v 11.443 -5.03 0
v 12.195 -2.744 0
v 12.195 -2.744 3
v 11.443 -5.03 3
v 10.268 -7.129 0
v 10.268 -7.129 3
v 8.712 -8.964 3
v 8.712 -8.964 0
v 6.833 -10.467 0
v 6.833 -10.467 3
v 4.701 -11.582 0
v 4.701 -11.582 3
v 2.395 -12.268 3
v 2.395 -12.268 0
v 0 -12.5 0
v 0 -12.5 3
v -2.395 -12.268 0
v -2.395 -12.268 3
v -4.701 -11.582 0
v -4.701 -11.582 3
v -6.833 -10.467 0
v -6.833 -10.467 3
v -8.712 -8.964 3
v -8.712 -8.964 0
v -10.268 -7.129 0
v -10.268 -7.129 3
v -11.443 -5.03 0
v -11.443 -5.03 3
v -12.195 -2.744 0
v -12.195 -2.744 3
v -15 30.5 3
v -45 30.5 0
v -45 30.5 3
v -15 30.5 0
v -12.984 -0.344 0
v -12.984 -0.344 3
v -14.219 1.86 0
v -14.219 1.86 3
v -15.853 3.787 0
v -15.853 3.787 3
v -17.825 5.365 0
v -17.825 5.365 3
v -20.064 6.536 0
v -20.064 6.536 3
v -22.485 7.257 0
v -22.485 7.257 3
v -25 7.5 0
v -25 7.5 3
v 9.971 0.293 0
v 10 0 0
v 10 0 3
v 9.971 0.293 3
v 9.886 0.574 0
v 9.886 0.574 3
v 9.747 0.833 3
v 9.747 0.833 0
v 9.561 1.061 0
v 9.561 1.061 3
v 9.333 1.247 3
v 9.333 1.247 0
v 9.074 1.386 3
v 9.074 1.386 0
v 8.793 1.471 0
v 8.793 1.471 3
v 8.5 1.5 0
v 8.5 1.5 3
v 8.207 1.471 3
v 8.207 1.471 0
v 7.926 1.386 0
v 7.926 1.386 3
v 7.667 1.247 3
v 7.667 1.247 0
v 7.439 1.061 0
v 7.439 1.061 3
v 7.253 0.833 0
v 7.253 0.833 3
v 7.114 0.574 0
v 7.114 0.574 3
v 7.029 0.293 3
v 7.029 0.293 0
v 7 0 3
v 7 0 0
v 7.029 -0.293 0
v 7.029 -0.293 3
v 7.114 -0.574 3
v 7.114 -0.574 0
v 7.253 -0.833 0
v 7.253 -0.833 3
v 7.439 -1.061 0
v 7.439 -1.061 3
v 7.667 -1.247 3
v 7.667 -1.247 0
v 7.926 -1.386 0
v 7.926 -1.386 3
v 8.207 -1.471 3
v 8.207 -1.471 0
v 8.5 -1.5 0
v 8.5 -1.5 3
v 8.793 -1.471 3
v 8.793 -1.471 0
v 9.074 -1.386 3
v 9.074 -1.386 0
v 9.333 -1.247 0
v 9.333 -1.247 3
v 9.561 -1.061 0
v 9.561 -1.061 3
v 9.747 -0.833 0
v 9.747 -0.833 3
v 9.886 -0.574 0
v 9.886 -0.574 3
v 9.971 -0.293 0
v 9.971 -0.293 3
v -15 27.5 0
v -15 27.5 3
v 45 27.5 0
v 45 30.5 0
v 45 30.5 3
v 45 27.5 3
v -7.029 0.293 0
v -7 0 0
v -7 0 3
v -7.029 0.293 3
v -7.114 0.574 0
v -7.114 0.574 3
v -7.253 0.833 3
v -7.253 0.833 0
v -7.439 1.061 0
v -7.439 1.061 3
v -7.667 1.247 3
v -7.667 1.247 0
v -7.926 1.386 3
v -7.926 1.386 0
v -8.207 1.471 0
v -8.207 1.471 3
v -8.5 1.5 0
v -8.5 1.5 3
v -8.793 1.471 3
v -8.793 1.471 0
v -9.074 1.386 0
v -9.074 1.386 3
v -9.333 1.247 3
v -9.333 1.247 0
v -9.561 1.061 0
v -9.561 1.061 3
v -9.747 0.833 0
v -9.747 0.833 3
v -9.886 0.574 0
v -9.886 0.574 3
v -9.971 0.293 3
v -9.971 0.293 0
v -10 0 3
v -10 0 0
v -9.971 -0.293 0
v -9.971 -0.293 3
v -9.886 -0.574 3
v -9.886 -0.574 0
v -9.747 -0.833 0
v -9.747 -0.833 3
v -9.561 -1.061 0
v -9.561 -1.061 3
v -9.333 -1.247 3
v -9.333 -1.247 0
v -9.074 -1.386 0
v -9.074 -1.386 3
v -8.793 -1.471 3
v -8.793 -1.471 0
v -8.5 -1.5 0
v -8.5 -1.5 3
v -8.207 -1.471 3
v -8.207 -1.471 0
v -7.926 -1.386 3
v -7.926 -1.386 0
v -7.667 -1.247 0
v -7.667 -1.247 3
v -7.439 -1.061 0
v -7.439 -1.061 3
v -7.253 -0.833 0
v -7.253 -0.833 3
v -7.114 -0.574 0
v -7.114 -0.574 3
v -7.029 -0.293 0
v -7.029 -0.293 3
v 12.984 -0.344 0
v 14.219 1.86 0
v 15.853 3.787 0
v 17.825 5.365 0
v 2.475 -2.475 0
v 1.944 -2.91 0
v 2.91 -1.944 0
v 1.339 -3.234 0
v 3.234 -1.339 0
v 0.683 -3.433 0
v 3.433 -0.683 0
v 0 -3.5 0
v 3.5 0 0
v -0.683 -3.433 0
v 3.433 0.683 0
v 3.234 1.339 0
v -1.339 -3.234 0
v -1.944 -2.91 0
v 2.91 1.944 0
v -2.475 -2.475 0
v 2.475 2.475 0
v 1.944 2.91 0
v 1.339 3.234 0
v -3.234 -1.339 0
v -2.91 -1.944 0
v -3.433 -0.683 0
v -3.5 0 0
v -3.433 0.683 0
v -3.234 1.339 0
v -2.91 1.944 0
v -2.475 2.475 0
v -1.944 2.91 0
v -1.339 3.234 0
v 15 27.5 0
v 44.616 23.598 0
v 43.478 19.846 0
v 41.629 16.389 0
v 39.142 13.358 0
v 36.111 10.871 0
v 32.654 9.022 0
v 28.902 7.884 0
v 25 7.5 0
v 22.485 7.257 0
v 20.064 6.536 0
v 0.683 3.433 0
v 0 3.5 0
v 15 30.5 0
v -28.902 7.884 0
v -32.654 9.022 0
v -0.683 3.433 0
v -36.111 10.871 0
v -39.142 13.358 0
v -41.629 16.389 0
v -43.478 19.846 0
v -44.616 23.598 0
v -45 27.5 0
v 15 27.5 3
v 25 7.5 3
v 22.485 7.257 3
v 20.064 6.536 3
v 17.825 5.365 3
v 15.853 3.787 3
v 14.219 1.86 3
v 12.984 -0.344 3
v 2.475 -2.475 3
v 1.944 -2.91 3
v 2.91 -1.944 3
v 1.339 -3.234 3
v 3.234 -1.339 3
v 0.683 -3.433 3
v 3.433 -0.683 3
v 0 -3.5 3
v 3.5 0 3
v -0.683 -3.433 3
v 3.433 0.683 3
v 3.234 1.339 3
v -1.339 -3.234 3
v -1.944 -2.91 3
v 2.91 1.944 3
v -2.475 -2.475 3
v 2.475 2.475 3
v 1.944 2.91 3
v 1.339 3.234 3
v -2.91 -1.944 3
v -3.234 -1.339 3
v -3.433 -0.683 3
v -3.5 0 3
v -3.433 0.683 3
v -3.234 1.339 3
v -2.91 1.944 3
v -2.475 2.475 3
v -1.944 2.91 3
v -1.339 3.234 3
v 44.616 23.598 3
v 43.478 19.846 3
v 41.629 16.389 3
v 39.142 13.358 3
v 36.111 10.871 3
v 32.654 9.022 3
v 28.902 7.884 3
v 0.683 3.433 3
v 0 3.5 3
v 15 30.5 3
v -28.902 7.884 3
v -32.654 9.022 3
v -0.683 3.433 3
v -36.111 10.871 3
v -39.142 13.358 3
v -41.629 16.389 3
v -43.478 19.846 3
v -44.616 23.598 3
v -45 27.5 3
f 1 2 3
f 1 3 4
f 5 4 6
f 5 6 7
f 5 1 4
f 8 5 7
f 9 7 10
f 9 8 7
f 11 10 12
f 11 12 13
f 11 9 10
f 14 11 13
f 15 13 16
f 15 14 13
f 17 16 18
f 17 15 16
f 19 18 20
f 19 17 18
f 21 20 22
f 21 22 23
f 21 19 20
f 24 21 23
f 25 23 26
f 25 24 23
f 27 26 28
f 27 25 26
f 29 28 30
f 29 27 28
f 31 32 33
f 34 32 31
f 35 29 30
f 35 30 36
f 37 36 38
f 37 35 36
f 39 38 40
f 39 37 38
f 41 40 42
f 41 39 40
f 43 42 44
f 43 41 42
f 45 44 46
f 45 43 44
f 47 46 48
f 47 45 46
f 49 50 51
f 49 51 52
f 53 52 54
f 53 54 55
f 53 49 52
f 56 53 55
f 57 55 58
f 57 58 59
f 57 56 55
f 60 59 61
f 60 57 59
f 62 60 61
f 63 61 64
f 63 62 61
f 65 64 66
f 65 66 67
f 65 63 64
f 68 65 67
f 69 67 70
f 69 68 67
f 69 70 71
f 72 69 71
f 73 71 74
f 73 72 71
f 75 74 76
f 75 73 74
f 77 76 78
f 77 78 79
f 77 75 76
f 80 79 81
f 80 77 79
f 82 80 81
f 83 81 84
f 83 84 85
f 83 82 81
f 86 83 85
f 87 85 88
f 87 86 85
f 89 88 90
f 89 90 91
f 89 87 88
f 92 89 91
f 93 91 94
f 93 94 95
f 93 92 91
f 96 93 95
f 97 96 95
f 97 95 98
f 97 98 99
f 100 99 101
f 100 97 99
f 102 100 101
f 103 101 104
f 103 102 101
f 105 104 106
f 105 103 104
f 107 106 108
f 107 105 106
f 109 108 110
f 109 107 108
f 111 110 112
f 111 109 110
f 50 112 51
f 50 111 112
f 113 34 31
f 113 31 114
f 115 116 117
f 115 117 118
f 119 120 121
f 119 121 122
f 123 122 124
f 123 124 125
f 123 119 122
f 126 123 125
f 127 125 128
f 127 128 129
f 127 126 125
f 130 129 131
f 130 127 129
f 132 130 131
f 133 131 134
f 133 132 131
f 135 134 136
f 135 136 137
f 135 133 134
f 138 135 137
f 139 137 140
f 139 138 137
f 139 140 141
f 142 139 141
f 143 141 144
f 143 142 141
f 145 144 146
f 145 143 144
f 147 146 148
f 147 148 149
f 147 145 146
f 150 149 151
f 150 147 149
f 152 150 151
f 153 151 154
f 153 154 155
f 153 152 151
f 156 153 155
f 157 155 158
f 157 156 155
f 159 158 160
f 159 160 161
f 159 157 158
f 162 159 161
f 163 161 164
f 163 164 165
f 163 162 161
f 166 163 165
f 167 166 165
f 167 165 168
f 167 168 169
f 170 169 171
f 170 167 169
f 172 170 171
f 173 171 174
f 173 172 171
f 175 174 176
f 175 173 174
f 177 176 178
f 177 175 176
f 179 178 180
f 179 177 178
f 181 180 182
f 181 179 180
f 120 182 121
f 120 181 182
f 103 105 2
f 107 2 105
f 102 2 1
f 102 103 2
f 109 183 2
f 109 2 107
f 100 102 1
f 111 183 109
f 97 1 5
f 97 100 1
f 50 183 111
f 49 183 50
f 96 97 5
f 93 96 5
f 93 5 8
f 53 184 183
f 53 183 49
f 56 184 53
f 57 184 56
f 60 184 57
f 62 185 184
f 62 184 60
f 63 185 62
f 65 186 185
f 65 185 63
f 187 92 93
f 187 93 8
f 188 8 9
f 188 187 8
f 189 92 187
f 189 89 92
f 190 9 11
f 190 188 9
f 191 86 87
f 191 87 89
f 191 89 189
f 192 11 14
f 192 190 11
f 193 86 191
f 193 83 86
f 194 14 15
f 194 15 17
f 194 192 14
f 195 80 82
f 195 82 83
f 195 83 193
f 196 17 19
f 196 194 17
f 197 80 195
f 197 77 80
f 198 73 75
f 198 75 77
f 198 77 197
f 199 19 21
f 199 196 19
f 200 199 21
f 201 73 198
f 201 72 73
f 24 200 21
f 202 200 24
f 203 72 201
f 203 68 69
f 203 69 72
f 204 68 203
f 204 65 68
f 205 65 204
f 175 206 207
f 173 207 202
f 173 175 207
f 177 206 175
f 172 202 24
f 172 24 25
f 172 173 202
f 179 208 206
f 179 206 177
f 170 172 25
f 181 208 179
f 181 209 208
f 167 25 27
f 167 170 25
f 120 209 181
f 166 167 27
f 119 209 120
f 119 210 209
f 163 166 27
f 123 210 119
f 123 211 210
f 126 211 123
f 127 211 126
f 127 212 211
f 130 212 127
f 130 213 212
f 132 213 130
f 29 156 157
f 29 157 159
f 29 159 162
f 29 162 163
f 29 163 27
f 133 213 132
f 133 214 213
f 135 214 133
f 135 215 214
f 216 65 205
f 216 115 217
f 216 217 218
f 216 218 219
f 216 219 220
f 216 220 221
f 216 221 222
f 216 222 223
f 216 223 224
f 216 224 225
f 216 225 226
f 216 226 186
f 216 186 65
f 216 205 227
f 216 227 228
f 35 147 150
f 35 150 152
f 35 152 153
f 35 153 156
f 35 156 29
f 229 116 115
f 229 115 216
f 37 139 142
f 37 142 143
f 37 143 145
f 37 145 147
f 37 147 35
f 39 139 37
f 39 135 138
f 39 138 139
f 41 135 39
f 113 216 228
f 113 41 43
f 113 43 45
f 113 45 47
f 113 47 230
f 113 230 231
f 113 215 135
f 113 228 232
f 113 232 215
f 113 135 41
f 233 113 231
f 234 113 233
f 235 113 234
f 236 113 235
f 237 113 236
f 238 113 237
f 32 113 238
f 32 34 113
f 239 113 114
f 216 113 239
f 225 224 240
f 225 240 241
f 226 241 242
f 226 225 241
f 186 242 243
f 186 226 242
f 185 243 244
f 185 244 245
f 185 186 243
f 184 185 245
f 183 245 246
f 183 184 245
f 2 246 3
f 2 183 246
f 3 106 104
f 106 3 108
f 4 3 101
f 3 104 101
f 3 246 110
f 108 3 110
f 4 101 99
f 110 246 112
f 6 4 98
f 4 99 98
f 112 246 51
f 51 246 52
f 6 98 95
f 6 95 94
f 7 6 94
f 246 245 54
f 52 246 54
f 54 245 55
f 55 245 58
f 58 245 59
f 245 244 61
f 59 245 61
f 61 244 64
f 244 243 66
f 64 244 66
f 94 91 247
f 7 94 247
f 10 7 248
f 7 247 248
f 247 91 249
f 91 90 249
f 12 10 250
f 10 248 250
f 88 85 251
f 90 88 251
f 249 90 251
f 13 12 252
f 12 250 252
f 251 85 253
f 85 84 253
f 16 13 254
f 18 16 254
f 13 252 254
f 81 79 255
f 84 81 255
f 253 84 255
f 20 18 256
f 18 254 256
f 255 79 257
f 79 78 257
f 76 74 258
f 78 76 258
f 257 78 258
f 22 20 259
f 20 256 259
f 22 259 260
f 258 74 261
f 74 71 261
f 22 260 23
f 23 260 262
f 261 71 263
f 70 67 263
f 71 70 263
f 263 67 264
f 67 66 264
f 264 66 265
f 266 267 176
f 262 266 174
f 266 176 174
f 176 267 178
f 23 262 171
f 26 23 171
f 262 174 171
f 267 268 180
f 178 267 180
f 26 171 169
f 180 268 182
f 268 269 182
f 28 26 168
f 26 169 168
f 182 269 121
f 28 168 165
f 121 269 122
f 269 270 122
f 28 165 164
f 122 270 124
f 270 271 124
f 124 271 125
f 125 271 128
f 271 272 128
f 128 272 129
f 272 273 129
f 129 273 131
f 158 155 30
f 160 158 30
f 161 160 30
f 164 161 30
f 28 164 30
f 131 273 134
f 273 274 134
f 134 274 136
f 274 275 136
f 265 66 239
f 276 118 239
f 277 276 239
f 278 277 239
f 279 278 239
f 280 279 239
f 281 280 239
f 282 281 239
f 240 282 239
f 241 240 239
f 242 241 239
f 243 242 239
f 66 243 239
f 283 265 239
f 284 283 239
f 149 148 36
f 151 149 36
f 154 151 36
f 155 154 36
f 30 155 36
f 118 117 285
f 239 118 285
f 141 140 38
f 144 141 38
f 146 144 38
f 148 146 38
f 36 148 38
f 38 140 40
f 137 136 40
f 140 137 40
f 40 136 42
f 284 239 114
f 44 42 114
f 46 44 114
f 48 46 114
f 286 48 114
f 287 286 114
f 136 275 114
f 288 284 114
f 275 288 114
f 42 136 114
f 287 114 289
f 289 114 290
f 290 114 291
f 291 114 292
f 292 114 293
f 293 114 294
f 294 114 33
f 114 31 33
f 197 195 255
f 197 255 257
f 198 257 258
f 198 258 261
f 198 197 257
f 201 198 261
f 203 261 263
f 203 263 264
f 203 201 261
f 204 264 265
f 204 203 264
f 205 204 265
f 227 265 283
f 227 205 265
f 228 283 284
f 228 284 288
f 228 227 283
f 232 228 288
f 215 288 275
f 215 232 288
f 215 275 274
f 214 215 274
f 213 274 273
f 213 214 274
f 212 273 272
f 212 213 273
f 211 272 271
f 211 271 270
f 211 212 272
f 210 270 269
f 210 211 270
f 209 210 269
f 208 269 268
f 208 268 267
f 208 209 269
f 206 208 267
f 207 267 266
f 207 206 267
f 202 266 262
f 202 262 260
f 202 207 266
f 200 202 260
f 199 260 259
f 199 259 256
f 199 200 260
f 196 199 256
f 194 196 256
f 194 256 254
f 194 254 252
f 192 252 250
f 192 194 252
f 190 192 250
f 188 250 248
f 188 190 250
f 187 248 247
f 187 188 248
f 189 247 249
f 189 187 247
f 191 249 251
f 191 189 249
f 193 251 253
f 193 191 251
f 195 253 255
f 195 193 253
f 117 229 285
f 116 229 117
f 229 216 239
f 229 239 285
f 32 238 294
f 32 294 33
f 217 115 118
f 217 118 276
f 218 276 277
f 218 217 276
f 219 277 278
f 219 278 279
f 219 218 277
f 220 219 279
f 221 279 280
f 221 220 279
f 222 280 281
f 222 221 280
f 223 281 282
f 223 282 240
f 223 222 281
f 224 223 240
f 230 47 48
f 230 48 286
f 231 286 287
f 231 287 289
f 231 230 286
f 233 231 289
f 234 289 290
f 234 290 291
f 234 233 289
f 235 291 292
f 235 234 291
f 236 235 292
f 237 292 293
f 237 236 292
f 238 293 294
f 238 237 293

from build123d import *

# Parameters (mm, degrees)
SKETCH1_R           = 1.5
SKETCH1_R_2         = 3.5
BOSS_EXTRUDE1_DEPTH = 3


with BuildPart() as part:
    # Sketch1 → Boss-Extrude1 (new body)
    with BuildSketch(Plane.XY):
        with BuildLine():
            Line((-15, 27.5), (15, 27.5))
            Line((15, 27.5), (15, 30.5))
            Line((15, 30.5), (45, 30.5))
            Line((45, 30.5), (45, 27.5))
            ThreePointArc((45, 27.5), (39.142135624, 13.357864376), (25, 7.5))
            ThreePointArc((25, 7.5), (16.800877501, 4.623903124), (12.195121951, -2.743902439))
            ThreePointArc((12.195121951, -2.743902439), (0, -12.5), (-12.195121951, -2.743902439))
            ThreePointArc((-12.195121951, -2.743902439), (-16.800877501, 4.623903124), (-25, 7.5))
            ThreePointArc((-25, 7.5), (-39.142135624, 13.357864376), (-45, 27.5))
            Line((-45, 27.5), (-45, 30.5))
            Line((-45, 30.5), (-15, 30.5))
            Line((-15, 30.5), (-15, 27.5))
        make_face()
        with Locations((-8.5, 0)):
            Circle(SKETCH1_R, mode=Mode.SUBTRACT)
        with Locations((8.5, 0)):
            Circle(SKETCH1_R, mode=Mode.SUBTRACT)
        Circle(SKETCH1_R_2, mode=Mode.SUBTRACT)
    extrude(amount=BOSS_EXTRUDE1_DEPTH)


solid = part.part
